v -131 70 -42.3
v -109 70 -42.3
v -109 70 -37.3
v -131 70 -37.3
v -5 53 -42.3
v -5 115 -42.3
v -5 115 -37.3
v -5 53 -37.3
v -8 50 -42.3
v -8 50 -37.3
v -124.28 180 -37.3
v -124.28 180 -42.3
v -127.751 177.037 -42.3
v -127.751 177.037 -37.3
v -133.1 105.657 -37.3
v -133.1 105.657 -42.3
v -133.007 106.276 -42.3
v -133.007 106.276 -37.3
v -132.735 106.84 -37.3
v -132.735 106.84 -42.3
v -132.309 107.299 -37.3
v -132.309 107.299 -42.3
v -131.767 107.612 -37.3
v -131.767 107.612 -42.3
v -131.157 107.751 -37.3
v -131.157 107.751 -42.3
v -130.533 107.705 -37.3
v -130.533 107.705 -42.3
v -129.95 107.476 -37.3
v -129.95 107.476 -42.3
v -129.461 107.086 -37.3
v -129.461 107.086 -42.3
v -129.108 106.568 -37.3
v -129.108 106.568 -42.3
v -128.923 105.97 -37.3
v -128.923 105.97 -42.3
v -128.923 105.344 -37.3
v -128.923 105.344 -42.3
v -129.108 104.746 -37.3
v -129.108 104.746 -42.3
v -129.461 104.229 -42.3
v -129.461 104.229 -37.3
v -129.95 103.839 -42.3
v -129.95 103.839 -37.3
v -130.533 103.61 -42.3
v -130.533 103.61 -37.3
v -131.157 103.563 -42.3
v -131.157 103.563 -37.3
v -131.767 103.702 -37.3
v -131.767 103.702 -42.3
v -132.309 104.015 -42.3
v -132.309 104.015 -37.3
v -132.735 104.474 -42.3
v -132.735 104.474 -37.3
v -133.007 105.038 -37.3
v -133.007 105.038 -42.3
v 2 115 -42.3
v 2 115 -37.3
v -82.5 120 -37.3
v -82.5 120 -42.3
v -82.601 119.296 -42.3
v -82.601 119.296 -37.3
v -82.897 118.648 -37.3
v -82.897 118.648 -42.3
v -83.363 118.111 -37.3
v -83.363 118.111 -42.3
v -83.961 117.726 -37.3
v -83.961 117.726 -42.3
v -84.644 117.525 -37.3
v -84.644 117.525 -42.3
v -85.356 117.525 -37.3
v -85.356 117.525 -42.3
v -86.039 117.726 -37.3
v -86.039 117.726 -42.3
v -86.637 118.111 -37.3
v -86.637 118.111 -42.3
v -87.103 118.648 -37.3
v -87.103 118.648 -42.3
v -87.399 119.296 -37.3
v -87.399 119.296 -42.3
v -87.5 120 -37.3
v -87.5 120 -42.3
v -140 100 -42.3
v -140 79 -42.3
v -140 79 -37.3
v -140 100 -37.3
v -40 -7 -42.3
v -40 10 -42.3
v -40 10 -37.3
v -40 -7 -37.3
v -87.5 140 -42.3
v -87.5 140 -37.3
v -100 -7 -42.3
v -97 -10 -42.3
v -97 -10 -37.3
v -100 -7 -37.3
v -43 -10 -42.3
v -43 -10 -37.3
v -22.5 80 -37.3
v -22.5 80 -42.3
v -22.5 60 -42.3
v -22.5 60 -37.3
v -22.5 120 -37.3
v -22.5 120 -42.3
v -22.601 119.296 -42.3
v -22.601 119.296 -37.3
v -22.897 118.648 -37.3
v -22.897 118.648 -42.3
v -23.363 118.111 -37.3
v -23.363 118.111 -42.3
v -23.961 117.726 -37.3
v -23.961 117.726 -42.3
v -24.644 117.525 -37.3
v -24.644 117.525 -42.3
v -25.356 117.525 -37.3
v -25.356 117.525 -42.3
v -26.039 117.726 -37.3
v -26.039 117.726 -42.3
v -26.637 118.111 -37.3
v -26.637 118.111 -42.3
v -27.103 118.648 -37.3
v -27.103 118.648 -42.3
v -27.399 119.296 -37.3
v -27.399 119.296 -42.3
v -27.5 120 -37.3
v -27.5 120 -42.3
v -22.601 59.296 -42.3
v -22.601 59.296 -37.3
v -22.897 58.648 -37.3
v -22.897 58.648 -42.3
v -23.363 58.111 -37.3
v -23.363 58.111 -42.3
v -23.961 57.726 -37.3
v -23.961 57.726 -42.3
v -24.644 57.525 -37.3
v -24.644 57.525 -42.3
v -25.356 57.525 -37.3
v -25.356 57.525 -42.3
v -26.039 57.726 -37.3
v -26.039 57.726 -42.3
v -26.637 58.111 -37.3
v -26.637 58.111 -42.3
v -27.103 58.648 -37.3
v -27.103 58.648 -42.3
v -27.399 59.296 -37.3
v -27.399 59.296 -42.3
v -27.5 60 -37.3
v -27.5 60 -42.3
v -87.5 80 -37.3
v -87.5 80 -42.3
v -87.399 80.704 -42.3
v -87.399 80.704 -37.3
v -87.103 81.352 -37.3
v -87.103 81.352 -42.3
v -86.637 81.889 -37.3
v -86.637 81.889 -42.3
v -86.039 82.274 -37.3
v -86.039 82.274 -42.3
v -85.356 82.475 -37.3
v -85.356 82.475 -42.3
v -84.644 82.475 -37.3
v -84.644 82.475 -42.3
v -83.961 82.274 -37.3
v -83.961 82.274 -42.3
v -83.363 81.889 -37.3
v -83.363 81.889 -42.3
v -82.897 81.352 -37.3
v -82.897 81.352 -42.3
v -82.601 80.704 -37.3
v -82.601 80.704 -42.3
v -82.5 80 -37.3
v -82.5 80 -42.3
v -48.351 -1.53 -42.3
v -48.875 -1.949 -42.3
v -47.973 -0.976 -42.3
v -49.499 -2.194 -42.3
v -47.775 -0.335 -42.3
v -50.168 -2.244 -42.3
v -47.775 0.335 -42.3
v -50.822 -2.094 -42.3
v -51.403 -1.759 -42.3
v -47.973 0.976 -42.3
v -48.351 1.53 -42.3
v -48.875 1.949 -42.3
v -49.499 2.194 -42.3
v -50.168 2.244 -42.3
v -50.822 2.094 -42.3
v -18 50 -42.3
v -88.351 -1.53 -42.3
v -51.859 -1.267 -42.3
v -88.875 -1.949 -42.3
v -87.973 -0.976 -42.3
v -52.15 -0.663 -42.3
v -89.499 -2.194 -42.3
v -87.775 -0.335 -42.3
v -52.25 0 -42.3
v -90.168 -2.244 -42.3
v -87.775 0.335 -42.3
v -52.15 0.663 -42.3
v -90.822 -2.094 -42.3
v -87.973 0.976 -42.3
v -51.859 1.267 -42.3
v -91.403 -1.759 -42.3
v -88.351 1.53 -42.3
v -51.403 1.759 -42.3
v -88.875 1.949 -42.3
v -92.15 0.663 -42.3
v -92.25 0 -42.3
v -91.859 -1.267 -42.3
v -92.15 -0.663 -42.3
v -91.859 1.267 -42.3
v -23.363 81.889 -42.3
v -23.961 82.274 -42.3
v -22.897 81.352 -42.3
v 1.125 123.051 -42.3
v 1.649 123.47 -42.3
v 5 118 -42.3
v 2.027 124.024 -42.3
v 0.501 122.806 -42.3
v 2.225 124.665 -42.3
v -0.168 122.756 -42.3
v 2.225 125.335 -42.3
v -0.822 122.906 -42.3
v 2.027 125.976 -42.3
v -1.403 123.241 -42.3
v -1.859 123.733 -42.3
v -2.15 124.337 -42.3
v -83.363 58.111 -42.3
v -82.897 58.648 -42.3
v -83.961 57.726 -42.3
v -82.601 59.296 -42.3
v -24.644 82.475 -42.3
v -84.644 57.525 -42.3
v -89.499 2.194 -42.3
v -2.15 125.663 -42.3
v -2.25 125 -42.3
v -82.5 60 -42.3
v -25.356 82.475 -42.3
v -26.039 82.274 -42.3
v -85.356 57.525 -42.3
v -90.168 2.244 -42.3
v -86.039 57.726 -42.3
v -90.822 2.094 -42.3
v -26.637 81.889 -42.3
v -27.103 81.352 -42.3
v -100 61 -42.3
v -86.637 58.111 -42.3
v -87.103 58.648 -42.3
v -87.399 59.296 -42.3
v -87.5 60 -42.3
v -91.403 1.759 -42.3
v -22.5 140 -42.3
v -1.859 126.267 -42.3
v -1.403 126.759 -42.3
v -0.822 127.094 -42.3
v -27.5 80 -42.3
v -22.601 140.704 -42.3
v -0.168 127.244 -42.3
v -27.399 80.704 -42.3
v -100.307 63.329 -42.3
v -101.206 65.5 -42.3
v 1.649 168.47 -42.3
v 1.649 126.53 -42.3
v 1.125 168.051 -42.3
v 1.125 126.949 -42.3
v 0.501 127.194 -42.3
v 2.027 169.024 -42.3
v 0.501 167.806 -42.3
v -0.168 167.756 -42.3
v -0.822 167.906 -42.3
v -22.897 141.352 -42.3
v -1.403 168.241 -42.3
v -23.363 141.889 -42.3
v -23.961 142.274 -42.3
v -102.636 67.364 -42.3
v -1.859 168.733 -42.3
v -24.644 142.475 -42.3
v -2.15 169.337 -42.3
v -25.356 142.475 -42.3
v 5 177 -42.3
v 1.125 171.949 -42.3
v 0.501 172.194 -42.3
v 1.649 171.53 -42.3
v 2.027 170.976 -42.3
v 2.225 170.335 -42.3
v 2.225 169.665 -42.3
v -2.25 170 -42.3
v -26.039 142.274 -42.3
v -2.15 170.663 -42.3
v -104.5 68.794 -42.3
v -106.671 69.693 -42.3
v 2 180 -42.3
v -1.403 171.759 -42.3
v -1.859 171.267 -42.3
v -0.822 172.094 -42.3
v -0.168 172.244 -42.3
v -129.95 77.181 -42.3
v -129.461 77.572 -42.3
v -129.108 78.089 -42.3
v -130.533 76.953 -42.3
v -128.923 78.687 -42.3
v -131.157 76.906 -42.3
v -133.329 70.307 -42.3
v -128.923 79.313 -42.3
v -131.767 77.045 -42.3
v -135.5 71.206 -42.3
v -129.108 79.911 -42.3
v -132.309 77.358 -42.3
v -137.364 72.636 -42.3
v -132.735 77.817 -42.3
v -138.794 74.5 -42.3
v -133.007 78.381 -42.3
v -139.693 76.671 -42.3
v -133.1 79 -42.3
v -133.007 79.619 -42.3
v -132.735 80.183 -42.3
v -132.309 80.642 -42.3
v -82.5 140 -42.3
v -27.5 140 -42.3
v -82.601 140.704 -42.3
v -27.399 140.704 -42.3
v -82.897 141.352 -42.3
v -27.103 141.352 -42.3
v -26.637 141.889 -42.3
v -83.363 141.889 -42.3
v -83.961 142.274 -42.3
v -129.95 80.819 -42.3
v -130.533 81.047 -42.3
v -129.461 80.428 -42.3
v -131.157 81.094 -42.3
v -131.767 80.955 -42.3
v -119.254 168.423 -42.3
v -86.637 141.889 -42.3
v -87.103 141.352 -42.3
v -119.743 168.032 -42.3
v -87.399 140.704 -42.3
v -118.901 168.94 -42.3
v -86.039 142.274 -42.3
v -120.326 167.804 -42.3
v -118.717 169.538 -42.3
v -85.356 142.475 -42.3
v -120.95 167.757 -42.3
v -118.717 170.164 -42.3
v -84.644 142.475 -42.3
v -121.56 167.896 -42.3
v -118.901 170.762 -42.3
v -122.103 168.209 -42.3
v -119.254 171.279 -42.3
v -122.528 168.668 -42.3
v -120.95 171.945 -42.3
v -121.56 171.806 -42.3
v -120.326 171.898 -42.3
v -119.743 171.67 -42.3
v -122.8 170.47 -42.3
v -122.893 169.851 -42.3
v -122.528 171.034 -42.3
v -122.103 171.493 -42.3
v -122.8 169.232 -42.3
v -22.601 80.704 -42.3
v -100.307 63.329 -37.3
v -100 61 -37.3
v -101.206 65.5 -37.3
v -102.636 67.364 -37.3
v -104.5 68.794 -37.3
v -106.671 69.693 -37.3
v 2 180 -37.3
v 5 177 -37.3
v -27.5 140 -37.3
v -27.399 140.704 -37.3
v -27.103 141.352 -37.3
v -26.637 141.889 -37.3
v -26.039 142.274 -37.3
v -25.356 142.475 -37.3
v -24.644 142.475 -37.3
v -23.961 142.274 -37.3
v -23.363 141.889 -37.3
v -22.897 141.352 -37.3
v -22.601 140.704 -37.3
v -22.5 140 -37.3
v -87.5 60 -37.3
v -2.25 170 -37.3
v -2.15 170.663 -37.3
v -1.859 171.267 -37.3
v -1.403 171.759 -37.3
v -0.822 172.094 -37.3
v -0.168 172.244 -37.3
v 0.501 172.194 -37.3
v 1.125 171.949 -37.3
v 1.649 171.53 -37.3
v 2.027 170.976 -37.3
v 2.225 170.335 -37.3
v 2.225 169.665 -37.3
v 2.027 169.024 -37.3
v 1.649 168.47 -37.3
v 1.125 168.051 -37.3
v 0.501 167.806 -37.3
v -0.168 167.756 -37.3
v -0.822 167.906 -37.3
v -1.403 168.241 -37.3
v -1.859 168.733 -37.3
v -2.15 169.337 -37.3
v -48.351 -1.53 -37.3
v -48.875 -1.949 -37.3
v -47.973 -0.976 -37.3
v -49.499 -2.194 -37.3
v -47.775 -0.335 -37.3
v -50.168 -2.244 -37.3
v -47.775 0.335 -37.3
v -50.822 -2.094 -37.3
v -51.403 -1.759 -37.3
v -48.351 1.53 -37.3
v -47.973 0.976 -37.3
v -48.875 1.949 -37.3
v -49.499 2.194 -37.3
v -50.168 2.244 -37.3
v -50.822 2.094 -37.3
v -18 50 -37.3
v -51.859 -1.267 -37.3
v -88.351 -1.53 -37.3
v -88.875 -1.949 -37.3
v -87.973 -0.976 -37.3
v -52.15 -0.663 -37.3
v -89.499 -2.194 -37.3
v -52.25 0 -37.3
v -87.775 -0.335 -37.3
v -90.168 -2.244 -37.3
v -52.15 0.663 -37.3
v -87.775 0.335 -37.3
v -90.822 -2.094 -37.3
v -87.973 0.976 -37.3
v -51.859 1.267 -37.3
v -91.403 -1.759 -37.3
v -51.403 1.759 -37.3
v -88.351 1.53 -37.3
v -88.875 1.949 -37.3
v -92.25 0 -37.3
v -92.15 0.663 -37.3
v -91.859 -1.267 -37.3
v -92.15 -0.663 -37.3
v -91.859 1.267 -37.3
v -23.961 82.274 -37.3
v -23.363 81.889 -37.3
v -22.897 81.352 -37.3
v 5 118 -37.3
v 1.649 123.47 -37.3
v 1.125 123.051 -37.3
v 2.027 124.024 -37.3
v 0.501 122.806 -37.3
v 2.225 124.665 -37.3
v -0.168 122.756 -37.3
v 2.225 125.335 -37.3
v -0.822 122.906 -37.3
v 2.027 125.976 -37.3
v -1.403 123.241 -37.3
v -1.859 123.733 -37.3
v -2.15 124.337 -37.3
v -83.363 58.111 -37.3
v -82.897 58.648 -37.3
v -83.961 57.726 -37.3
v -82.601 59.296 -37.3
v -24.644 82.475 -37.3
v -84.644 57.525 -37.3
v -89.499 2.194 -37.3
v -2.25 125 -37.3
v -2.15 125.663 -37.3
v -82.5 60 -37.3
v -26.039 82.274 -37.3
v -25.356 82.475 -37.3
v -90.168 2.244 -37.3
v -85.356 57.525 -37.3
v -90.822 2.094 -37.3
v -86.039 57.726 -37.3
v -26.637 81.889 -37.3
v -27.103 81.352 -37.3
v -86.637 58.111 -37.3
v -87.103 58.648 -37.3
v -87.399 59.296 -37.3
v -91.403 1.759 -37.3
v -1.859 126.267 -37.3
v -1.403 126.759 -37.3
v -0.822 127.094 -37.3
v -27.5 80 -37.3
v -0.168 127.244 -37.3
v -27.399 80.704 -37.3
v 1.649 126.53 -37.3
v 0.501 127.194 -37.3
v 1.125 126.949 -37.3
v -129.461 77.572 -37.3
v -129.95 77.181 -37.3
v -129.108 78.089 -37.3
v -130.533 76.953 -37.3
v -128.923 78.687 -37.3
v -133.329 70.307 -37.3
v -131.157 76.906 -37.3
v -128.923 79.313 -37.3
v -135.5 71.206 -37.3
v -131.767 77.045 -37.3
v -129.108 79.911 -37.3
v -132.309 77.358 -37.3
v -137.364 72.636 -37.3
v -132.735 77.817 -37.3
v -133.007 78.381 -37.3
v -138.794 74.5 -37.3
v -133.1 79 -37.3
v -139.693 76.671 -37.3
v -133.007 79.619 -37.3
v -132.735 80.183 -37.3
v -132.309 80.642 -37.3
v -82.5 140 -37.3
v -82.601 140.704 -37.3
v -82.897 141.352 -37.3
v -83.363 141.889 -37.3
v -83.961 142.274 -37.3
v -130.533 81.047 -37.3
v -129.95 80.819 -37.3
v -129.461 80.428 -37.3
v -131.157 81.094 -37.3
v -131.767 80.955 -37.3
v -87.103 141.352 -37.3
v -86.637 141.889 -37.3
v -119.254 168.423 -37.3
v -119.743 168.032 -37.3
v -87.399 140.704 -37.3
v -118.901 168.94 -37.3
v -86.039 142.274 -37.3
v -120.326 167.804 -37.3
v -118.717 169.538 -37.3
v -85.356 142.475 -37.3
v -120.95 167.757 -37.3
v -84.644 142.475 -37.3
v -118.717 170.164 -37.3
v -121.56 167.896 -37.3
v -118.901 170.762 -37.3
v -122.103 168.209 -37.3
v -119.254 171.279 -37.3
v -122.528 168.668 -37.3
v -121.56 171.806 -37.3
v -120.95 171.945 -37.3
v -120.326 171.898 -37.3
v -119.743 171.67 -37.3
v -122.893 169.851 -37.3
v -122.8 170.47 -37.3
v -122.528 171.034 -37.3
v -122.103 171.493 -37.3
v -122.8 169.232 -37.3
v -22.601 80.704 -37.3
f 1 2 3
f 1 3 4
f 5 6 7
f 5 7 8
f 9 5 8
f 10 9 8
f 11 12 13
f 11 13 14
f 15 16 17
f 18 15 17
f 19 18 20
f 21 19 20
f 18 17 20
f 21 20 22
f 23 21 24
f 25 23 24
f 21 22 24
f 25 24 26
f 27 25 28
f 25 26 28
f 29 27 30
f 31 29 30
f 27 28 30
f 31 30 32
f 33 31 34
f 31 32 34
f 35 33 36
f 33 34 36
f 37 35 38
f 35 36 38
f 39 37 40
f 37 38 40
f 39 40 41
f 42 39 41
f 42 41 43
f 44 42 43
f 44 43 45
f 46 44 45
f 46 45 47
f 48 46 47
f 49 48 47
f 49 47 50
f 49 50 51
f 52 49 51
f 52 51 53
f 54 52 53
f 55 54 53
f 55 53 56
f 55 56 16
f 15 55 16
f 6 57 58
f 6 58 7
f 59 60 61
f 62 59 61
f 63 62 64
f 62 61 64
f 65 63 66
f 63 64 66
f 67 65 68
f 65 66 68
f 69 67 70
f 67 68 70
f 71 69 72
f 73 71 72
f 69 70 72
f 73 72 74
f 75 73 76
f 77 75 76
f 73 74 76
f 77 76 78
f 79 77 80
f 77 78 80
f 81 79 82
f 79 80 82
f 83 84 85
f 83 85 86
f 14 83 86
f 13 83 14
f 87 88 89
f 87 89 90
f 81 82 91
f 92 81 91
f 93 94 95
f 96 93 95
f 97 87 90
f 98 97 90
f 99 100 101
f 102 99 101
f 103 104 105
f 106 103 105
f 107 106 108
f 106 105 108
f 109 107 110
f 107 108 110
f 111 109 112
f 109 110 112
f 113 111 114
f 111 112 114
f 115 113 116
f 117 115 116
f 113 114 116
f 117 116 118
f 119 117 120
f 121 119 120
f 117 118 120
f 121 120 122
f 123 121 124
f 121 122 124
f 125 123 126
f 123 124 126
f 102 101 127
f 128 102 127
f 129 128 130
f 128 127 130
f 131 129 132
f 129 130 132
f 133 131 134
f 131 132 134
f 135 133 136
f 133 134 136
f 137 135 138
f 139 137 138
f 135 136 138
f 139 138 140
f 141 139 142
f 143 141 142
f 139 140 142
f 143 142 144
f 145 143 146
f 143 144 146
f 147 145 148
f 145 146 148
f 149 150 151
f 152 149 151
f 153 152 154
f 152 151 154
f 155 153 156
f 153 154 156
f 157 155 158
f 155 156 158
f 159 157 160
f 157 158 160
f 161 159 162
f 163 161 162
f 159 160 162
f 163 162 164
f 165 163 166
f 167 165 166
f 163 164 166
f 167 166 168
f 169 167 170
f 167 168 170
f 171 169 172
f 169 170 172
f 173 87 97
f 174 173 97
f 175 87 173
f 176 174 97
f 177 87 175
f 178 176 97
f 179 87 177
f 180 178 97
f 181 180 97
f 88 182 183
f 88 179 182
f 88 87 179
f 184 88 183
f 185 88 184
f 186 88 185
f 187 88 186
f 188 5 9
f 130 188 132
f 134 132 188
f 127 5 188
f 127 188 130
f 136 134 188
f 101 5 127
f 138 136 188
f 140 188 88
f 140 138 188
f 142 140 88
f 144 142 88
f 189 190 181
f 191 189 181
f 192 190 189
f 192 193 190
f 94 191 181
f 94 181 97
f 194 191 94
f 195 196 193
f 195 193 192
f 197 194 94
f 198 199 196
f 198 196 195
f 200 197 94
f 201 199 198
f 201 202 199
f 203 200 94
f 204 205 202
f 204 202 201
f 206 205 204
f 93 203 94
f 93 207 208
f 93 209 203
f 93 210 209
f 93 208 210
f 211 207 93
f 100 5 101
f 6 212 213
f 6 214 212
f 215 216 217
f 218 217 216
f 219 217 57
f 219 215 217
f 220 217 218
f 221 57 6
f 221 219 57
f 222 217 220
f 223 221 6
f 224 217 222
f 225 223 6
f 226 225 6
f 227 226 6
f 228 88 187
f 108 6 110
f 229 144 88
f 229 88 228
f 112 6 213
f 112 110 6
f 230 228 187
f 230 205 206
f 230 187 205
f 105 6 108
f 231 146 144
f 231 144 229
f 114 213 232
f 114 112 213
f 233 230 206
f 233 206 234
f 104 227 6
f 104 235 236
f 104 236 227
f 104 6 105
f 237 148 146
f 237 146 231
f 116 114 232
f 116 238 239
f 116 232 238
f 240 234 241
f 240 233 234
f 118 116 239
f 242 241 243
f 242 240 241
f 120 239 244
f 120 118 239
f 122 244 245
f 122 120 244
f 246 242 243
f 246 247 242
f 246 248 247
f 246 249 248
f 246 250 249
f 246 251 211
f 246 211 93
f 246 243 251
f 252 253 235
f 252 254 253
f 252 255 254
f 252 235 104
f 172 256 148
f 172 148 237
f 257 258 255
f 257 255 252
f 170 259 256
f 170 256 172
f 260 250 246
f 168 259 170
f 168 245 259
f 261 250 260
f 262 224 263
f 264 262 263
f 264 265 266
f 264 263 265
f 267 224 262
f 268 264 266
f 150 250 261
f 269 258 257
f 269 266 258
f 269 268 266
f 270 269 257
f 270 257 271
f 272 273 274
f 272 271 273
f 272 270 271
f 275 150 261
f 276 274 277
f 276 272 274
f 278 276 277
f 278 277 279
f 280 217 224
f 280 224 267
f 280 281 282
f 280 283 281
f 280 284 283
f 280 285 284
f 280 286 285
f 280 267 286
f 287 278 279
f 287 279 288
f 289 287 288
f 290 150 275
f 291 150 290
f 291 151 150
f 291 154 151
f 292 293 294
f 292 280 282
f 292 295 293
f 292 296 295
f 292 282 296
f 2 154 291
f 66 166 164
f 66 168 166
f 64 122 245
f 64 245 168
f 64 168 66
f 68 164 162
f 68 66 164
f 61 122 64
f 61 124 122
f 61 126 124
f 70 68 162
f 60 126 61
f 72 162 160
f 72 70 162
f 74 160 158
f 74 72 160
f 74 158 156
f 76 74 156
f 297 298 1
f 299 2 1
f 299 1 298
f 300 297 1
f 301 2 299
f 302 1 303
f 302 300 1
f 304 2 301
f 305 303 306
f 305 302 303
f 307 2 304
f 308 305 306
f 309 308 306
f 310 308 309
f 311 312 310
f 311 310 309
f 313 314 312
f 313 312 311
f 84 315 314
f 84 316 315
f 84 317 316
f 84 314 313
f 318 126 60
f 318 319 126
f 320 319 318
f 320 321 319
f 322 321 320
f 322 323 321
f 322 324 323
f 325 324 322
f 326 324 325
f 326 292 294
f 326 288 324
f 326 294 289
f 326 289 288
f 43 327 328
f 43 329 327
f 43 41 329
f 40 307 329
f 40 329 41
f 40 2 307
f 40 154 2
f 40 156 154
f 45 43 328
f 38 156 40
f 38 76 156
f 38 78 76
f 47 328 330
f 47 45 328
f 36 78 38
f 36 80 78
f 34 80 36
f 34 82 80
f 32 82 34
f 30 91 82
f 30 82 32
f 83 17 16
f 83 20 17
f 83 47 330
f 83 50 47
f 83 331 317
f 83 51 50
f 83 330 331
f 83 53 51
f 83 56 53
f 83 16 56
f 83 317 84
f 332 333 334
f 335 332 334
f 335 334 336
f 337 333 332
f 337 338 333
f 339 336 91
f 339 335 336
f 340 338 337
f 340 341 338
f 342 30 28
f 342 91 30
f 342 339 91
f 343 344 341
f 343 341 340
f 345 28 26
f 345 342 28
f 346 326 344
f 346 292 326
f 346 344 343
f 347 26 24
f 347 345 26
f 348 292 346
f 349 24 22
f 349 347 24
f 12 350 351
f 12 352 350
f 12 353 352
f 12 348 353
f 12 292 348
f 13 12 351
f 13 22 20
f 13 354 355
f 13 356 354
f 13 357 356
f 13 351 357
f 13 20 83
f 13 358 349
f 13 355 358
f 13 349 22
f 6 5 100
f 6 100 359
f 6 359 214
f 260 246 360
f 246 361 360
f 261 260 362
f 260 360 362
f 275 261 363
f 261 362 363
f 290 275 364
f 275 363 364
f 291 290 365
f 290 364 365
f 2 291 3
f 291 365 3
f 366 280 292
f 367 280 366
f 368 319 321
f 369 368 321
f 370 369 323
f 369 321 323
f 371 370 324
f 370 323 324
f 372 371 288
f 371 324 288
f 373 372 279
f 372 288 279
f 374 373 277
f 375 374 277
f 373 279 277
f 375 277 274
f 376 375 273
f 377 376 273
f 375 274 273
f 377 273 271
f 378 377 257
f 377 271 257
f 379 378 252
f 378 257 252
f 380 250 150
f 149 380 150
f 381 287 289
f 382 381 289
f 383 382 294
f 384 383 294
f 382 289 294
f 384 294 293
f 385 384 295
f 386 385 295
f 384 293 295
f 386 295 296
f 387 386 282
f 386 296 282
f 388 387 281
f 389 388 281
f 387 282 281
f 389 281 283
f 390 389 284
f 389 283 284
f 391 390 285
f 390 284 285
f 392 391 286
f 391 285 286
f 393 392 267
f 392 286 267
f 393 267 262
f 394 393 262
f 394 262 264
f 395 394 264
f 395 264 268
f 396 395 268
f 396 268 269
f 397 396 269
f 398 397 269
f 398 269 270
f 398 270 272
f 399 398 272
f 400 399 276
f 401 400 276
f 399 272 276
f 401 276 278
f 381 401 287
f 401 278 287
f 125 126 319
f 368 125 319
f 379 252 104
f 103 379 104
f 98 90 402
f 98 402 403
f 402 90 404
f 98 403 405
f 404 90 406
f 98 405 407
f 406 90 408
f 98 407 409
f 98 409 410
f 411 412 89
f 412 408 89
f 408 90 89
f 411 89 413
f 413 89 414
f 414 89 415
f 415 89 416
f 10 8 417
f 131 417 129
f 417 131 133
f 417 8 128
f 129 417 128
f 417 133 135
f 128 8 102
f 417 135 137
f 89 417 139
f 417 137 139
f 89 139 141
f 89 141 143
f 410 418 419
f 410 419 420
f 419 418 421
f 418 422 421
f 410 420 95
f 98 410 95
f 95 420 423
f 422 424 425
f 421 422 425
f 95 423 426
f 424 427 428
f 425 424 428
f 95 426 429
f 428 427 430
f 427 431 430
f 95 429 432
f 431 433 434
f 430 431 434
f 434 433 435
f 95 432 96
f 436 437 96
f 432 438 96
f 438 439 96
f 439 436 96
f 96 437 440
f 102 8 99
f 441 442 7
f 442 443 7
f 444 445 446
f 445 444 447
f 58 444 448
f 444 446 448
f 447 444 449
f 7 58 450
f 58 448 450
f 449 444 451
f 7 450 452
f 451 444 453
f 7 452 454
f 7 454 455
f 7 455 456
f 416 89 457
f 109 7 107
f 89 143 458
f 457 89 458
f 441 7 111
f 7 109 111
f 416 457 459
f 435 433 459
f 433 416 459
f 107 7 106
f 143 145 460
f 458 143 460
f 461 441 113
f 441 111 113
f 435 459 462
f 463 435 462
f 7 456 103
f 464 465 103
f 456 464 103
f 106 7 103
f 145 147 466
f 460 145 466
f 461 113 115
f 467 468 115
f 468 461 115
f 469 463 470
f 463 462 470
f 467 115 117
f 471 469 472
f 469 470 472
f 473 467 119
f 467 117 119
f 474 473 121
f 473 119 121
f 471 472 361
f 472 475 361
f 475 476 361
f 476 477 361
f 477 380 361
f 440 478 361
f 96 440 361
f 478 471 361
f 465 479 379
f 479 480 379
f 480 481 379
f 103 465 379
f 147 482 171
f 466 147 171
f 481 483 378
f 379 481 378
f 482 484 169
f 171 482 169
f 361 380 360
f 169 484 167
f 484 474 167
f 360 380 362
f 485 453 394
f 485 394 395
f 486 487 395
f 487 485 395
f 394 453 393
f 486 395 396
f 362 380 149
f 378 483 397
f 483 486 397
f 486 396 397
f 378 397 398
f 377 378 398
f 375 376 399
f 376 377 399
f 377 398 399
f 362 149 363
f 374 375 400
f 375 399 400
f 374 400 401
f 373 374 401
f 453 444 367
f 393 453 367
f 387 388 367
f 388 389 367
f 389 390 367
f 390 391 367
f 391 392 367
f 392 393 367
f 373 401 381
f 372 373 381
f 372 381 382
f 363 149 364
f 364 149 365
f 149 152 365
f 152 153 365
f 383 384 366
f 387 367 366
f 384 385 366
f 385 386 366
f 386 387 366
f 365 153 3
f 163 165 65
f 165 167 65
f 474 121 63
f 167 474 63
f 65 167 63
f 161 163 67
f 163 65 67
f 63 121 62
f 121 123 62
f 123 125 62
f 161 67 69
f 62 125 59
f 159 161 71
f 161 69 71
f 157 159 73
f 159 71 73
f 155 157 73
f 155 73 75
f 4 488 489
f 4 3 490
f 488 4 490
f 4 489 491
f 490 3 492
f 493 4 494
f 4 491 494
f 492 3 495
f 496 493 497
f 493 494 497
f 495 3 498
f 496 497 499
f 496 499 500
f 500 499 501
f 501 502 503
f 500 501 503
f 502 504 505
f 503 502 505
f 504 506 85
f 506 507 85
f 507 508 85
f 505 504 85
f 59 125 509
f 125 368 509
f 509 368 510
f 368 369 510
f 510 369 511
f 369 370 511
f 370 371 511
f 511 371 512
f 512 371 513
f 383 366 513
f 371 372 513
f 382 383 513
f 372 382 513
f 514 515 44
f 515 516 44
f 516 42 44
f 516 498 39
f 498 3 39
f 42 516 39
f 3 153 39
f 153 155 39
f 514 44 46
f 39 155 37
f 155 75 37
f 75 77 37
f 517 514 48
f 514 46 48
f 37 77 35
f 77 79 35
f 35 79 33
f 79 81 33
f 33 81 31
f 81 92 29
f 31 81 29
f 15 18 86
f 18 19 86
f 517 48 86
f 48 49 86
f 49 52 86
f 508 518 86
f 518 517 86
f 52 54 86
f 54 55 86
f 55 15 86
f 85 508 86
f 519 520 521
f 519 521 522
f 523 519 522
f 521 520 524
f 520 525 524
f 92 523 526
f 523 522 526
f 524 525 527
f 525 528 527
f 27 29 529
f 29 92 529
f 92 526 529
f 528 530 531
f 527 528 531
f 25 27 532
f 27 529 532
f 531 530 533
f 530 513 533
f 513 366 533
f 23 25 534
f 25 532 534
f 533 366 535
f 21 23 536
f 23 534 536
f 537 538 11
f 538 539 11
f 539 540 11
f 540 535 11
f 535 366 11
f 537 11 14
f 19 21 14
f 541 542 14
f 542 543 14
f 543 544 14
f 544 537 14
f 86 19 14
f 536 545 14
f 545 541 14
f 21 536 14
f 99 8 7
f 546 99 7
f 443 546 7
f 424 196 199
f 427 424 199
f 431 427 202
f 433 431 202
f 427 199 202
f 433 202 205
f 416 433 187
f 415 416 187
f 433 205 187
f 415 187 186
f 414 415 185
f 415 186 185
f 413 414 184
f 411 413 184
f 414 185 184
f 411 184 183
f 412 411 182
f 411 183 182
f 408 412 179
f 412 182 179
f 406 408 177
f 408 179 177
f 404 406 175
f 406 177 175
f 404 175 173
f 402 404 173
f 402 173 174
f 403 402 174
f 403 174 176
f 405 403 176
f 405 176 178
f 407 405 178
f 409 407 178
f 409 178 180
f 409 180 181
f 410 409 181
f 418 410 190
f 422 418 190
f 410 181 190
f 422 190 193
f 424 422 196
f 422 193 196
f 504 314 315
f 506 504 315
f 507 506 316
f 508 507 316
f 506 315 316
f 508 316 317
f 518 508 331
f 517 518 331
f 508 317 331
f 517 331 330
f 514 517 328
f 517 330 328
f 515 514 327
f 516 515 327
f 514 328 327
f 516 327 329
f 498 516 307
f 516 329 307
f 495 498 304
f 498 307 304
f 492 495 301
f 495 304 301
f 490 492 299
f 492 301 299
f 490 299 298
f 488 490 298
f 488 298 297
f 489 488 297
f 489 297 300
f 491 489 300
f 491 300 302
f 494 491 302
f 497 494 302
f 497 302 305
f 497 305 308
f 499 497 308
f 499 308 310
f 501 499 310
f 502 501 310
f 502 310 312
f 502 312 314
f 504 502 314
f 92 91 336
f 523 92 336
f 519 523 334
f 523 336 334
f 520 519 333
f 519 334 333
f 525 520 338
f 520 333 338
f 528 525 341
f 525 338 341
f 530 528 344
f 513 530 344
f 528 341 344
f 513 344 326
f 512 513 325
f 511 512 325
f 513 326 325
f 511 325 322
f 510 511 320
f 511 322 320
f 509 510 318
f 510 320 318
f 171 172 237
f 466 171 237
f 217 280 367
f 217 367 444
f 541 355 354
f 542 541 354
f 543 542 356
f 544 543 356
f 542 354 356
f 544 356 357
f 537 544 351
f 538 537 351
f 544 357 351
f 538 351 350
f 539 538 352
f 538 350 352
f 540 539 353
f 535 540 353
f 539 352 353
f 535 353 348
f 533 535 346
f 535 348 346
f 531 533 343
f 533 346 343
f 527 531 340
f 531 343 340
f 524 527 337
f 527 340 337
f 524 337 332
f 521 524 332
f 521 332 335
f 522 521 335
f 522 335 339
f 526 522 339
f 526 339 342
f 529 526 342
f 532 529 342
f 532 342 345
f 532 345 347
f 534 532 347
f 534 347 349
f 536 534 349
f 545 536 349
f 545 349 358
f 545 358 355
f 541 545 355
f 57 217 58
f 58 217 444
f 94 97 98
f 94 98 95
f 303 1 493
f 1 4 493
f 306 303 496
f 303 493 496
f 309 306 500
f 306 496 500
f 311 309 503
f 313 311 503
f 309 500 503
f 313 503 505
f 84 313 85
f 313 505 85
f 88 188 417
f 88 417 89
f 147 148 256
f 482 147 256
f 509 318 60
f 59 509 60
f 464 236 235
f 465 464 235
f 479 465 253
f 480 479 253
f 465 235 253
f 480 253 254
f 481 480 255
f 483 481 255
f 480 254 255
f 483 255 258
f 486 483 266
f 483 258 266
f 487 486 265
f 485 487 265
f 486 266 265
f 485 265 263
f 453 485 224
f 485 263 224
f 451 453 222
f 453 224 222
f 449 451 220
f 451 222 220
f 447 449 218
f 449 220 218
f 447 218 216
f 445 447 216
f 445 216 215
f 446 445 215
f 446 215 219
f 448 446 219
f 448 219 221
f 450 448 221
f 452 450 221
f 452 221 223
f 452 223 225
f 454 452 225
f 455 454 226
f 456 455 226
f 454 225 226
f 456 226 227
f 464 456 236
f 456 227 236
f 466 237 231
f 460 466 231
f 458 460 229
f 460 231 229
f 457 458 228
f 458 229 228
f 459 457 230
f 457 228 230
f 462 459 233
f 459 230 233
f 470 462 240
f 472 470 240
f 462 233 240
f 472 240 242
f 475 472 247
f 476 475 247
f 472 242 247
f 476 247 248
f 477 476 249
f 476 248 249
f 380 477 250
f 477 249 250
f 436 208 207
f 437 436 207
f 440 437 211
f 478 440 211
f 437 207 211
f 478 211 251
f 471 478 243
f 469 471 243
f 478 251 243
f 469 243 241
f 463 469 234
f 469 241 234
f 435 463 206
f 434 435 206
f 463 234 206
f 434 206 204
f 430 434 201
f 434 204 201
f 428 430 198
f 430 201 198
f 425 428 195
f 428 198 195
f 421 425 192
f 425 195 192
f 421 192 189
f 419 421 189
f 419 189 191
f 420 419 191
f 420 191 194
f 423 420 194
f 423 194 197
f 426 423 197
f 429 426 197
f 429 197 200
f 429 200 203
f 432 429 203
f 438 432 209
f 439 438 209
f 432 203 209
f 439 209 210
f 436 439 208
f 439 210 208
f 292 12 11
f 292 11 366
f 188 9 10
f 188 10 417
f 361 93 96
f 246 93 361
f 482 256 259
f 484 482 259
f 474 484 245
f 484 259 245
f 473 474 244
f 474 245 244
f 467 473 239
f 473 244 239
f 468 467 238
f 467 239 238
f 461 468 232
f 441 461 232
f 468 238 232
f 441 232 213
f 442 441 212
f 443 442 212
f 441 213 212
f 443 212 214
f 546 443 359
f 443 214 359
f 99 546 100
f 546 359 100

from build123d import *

# Parameters (mm, degrees)
SKETCH039_R             = 2.25
PAD020_DEPTH            = 5
FILLET008_R             = 9
CHAMFER018_SIZE         = 3
SKETCH047_R             = 2.1
POCKET026_DEPTH         = 5.001
BODY013_PLACEMENT_ANGLE = 180


with BuildPart() as part:
    # Sketch039 → Pad020 (new body)
    with BuildSketch(Plane.XY):
        Polygon((100, -10), (100, 70), (140, 70), (140, 100), (127.28, 180), (-5, 180), (-5, 115), (5, 115), (5, 50), (18, 50), (40, 10), (40, -10), align=None)
        with Locations((90, 0)):
            Circle(SKETCH039_R, mode=Mode.SUBTRACT)
        with Locations((50, 0)):
            Circle(SKETCH039_R, mode=Mode.SUBTRACT)
        with Locations((0, 125)):
            Circle(SKETCH039_R, mode=Mode.SUBTRACT)
        with Locations((0, 170)):
            Circle(SKETCH039_R, mode=Mode.SUBTRACT)
    extrude(amount=-PAD020_DEPTH)

    # Fillet008
    fillet008_edges = [part.edges().sort_by_distance(p)[0] for p in [
        (100, 70, -2.5),
        (140, 70, -2.5),
    ]]
    fillet(fillet008_edges, radius=FILLET008_R)

    # Chamfer018
    chamfer018_edges = [part.edges().sort_by_distance(p)[0] for p in [
        (-5, 115, -2.5),
        (5, 50, -2.5),
        (-5, 180, -2.5),
        (127.28, 180, -2.5),
        (100, -10, -2.5),
        (40, -10, -2.5),
    ]]
    chamfer(chamfer018_edges, length=CHAMFER018_SIZE)

    # Sketch047 (on Face2 of Chamfer018) → Pocket026 (cut, through all)
    with BuildSketch(Plane.XY):
        with Locations((120.793214, 169.850903)):
            Circle(SKETCH047_R)
        with Locations((131, 79)):
            Circle(SKETCH047_R)
        with Locations((131, 105.657278)):
            Circle(SKETCH047_R)
        with BuildLine():
            ThreePointArc((27.5, 80), (25, 82.5), (22.5, 80))
            Line((22.5, 80), (22.5, 60))
            ThreePointArc((22.5, 60), (25, 57.5), (27.5, 60))
            Line((27.5, 60), (27.5, 80))
        make_face()
        with BuildLine():
            ThreePointArc((87.5, 80), (85, 82.5), (82.5, 80))
            Line((82.5, 80), (82.5, 60))
            ThreePointArc((82.5, 60), (85, 57.5), (87.5, 60))
            Line((87.5, 60), (87.5, 80))
        make_face()
        with BuildLine():
            ThreePointArc((27.5, 140), (25, 142.5), (22.5, 140))
            Line((22.5, 140), (22.5, 120))
            ThreePointArc((22.5, 120), (25, 117.5), (27.5, 120))
            Line((27.5, 120), (27.5, 140))
        make_face()
        with BuildLine():
            ThreePointArc((87.5, 140), (85, 142.5), (82.5, 140))
            Line((82.5, 140), (82.5, 120))
            ThreePointArc((82.5, 120), (85, 117.5), (87.5, 120))
            Line((87.5, 120), (87.5, 140))
        make_face()
    extrude(amount=-POCKET026_DEPTH, mode=Mode.SUBTRACT)


with BuildPart() as part_1:
    # Body013 placement: moved
    add(part.part.moved(Location((0, 0, -42.3))).rotate(Axis((0, 0, -42.3), (0, 1, 0)), BODY013_PLACEMENT_ANGLE))


solid = part_1.part
